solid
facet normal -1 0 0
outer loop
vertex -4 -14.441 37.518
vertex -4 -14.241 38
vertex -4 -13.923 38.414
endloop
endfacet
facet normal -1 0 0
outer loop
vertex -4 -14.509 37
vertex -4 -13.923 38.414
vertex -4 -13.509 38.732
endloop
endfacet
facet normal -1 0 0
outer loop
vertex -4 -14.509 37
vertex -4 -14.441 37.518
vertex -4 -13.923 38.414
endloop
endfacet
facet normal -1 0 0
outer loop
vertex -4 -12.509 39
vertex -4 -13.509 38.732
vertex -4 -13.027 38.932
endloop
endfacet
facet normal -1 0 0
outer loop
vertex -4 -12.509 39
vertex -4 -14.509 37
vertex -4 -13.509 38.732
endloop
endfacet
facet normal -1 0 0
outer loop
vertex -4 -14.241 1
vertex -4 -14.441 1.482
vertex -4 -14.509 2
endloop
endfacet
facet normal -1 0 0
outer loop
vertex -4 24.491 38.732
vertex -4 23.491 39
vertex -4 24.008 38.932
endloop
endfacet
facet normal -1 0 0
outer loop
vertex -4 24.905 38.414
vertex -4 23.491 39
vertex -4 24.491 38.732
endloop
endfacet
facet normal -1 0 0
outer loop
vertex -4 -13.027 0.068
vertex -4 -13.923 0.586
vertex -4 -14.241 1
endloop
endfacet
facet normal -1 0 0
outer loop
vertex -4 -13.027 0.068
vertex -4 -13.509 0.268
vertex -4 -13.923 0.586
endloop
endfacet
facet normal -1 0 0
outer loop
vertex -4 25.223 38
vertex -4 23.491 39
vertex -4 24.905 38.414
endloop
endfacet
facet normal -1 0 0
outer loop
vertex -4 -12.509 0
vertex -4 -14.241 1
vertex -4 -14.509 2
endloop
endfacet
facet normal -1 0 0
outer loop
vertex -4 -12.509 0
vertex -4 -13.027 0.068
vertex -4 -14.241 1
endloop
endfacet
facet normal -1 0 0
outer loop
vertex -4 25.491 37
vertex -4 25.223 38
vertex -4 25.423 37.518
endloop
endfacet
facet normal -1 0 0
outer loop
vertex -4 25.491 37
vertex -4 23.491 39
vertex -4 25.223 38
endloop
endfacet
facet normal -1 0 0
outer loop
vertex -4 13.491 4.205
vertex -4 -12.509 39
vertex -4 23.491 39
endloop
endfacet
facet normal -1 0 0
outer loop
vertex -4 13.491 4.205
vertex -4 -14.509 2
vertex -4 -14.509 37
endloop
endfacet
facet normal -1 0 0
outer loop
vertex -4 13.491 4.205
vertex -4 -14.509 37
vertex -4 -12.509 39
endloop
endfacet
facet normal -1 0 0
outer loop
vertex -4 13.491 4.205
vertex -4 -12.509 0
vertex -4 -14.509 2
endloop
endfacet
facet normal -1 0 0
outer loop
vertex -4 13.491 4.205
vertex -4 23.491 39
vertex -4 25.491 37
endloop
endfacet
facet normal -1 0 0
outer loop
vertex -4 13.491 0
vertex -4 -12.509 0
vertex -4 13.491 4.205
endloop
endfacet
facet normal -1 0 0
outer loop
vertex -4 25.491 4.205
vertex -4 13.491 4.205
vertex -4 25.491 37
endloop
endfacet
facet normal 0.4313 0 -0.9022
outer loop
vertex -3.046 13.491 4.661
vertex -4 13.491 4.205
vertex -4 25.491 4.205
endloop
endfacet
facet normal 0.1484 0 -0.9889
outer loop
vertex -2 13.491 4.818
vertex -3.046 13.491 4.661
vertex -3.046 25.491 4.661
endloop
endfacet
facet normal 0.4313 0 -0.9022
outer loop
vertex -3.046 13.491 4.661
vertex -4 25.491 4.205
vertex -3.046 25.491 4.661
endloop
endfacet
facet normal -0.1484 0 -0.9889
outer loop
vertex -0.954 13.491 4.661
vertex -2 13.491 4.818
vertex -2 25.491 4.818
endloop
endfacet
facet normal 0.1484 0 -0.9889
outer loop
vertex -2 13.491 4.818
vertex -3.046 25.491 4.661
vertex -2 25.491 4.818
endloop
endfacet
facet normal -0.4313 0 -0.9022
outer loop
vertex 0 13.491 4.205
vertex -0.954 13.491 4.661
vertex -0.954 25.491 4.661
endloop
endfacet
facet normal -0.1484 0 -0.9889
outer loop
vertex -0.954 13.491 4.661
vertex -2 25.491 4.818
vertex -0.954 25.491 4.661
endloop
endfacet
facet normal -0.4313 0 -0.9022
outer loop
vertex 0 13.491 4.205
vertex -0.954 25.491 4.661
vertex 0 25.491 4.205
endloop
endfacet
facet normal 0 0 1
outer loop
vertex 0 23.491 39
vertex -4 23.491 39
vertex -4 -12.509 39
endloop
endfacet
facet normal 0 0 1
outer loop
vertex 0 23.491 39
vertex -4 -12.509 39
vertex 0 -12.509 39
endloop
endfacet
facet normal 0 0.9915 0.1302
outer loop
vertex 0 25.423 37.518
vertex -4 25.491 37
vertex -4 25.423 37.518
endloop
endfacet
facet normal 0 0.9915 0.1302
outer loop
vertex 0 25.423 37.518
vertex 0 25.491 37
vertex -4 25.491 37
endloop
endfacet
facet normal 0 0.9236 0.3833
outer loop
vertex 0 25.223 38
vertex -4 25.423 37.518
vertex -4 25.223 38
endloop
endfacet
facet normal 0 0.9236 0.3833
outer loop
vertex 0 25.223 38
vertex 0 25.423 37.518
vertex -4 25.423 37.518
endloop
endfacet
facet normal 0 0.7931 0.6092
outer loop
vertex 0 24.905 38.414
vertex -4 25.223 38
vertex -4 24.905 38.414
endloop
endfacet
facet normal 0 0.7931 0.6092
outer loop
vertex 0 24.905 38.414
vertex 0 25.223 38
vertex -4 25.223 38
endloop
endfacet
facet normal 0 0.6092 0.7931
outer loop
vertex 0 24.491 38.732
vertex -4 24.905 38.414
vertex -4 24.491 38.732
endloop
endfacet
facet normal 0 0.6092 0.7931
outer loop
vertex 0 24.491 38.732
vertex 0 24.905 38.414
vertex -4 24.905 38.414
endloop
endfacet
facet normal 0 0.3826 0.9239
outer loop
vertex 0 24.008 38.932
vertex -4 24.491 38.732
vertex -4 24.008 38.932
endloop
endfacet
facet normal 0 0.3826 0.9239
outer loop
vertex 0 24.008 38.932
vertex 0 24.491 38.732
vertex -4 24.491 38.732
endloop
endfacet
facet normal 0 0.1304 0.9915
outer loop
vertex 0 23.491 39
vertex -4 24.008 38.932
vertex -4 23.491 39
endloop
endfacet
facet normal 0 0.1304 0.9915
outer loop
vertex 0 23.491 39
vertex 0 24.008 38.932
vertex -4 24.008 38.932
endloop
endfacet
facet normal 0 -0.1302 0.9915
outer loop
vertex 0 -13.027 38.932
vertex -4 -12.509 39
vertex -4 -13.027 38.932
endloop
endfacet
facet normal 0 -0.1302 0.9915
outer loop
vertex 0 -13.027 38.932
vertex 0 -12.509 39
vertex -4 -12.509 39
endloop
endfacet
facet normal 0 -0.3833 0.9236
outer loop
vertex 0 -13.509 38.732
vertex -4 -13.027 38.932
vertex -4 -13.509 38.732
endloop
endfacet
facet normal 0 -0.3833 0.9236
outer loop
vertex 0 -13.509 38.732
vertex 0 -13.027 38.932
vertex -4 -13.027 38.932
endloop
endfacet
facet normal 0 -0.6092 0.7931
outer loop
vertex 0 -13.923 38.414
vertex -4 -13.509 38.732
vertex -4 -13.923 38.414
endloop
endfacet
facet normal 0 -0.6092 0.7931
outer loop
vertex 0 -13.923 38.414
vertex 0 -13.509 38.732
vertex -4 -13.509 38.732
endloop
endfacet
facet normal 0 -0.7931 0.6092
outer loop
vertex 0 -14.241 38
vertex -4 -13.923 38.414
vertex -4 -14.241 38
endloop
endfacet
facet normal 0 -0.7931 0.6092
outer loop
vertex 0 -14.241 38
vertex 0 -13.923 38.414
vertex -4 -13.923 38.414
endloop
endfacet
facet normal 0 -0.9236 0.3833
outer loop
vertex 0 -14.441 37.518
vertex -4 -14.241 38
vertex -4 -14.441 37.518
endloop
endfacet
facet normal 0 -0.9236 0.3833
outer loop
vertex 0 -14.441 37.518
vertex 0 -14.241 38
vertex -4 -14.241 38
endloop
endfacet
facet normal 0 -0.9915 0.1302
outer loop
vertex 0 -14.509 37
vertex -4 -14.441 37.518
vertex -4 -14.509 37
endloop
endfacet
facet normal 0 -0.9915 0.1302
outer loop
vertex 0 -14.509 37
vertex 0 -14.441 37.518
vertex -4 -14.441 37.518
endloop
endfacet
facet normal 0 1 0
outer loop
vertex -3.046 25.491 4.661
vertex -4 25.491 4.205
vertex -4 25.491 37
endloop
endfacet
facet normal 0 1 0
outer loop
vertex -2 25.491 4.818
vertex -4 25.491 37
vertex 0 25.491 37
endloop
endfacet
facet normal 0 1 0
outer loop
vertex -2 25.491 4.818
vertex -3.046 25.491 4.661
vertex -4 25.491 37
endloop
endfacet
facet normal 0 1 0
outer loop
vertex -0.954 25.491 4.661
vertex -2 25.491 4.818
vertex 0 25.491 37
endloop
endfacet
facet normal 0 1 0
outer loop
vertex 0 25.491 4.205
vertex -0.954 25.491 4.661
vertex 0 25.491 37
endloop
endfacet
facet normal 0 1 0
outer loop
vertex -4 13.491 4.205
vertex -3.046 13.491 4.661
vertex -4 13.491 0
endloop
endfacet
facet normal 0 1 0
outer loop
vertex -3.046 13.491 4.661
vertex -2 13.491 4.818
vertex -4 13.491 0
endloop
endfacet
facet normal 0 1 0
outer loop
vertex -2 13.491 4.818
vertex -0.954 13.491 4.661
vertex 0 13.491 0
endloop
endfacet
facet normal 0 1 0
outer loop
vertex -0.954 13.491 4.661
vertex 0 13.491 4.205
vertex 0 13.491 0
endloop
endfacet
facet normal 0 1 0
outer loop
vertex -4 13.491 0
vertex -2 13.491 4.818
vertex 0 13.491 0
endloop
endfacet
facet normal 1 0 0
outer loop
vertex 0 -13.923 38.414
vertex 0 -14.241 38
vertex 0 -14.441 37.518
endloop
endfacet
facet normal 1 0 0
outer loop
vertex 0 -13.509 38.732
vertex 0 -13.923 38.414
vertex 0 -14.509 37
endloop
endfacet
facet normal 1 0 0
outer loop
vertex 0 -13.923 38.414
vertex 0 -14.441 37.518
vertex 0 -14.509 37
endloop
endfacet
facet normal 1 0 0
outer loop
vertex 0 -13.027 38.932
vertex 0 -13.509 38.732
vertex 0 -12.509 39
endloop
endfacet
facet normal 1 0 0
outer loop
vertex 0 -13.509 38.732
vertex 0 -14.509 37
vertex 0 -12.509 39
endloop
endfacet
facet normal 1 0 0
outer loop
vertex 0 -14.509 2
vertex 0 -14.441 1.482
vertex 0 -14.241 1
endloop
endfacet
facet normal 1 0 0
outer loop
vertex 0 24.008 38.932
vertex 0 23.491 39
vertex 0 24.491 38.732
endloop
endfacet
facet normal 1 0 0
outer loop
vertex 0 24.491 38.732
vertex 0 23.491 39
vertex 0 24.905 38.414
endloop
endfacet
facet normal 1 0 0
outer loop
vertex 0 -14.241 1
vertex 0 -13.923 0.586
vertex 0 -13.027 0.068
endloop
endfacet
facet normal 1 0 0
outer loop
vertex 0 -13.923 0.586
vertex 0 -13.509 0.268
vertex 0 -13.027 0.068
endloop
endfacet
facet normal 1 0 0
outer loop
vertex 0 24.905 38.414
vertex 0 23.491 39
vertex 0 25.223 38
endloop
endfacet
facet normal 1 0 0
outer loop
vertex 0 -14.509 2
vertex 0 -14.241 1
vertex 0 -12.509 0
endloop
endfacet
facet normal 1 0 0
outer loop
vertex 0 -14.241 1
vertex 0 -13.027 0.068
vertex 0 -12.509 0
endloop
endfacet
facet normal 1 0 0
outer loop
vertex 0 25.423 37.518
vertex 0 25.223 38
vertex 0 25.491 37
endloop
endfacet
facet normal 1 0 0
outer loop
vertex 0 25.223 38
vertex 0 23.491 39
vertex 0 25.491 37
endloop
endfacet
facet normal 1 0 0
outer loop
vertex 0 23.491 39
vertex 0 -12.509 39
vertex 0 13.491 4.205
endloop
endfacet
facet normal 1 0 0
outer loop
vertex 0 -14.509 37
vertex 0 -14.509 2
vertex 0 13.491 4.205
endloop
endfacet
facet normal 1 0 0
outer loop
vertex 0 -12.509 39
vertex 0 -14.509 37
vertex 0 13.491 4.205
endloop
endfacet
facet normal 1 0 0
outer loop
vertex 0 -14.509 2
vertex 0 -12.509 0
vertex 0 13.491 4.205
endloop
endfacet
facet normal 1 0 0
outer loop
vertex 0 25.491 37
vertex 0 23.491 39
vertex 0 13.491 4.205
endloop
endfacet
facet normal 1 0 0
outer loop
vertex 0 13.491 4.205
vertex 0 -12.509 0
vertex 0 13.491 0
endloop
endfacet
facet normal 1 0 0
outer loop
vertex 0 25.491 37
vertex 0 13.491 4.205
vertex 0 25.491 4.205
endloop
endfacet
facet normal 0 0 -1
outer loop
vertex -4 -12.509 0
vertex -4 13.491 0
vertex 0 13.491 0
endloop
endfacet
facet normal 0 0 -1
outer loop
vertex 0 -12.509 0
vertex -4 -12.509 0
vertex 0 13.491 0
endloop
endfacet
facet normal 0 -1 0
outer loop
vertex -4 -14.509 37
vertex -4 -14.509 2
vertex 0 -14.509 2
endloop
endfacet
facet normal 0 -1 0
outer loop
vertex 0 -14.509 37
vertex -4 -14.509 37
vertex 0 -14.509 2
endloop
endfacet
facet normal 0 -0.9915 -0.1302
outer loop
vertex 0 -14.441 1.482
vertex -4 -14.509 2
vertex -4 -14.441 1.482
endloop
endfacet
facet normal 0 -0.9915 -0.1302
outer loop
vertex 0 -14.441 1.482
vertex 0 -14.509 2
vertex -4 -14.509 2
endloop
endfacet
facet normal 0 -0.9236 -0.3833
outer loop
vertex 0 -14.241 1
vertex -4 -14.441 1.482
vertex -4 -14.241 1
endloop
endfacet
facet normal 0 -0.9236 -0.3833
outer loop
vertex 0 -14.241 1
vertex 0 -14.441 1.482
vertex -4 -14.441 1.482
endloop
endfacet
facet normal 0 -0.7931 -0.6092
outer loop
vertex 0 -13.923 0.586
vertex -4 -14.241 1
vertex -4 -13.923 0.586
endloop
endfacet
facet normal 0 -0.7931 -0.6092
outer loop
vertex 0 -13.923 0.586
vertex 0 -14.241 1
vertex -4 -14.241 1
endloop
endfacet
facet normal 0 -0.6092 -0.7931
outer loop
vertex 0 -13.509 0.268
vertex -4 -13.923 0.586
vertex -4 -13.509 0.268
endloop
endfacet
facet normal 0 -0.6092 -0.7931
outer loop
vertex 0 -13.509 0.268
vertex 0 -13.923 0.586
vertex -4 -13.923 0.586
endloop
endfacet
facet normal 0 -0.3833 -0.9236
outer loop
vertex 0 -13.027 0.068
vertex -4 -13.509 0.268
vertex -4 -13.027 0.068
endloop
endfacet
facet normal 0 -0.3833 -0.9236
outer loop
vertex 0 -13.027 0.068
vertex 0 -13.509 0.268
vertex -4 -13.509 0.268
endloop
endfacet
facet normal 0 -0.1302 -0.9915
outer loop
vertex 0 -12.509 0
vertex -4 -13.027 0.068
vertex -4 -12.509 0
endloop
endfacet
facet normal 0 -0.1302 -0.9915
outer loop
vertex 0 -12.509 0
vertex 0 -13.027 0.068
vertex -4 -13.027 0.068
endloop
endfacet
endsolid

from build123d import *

# Parameters (mm, degrees)
SKETCH1_W           = 4
SKETCH1_H           = 40
BOSS_EXTRUDE1_DEPTH = 39
SKETCH2_W           = 4
SKETCH2_H           = 12
CUT_EXTRUDE1_DEPTH  = 39
SKETCH5_R           = 3.567899071
CUT_EXTRUDE3_DEPTH  = 12
FILLET6_R           = 2
FILLET7_R           = 2


with BuildPart() as part:
    # Sketch1 → Boss-Extrude1 (new body)
    with BuildSketch(Plane.XY):
        with Locations((-2, 5.490763705)):
            Rectangle(SKETCH1_W, SKETCH1_H)
    extrude(amount=BOSS_EXTRUDE1_DEPTH)

    # Sketch2 → Cut-Extrude1 (cut)
    with BuildSketch(Plane(origin=(0, 0, 0), x_dir=(0, 0, -1), z_dir=(1, 0, 0))):
        with Locations((-2, 19.490763705)):
            Rectangle(SKETCH2_W, SKETCH2_H)
    extrude(amount=-CUT_EXTRUDE1_DEPTH, mode=Mode.SUBTRACT)

    # Sketch5 → Cut-Extrude3 (cut)
    with BuildSketch(Plane(origin=(0, 25.490763705, 0), x_dir=(1, 0, 0), z_dir=(0, 1, 0))):
        with Locations((-2, -1.249948334)):
            Circle(SKETCH5_R)
    extrude(amount=-CUT_EXTRUDE3_DEPTH, mode=Mode.SUBTRACT)

    # Fillet6
    fillet6_edges = [part.edges().sort_by_distance(p)[0] for p in [
        (-2, 25.490763705, 39),
    ]]
    fillet(fillet6_edges, radius=FILLET6_R)

    # Fillet7
    fillet7_edges = [part.edges().sort_by_distance(p)[0] for p in [
        (-2, -14.509236295, 0),
        (-2, -14.509236295, 39),
    ]]
    fillet(fillet7_edges, radius=FILLET7_R)


solid = part.part
